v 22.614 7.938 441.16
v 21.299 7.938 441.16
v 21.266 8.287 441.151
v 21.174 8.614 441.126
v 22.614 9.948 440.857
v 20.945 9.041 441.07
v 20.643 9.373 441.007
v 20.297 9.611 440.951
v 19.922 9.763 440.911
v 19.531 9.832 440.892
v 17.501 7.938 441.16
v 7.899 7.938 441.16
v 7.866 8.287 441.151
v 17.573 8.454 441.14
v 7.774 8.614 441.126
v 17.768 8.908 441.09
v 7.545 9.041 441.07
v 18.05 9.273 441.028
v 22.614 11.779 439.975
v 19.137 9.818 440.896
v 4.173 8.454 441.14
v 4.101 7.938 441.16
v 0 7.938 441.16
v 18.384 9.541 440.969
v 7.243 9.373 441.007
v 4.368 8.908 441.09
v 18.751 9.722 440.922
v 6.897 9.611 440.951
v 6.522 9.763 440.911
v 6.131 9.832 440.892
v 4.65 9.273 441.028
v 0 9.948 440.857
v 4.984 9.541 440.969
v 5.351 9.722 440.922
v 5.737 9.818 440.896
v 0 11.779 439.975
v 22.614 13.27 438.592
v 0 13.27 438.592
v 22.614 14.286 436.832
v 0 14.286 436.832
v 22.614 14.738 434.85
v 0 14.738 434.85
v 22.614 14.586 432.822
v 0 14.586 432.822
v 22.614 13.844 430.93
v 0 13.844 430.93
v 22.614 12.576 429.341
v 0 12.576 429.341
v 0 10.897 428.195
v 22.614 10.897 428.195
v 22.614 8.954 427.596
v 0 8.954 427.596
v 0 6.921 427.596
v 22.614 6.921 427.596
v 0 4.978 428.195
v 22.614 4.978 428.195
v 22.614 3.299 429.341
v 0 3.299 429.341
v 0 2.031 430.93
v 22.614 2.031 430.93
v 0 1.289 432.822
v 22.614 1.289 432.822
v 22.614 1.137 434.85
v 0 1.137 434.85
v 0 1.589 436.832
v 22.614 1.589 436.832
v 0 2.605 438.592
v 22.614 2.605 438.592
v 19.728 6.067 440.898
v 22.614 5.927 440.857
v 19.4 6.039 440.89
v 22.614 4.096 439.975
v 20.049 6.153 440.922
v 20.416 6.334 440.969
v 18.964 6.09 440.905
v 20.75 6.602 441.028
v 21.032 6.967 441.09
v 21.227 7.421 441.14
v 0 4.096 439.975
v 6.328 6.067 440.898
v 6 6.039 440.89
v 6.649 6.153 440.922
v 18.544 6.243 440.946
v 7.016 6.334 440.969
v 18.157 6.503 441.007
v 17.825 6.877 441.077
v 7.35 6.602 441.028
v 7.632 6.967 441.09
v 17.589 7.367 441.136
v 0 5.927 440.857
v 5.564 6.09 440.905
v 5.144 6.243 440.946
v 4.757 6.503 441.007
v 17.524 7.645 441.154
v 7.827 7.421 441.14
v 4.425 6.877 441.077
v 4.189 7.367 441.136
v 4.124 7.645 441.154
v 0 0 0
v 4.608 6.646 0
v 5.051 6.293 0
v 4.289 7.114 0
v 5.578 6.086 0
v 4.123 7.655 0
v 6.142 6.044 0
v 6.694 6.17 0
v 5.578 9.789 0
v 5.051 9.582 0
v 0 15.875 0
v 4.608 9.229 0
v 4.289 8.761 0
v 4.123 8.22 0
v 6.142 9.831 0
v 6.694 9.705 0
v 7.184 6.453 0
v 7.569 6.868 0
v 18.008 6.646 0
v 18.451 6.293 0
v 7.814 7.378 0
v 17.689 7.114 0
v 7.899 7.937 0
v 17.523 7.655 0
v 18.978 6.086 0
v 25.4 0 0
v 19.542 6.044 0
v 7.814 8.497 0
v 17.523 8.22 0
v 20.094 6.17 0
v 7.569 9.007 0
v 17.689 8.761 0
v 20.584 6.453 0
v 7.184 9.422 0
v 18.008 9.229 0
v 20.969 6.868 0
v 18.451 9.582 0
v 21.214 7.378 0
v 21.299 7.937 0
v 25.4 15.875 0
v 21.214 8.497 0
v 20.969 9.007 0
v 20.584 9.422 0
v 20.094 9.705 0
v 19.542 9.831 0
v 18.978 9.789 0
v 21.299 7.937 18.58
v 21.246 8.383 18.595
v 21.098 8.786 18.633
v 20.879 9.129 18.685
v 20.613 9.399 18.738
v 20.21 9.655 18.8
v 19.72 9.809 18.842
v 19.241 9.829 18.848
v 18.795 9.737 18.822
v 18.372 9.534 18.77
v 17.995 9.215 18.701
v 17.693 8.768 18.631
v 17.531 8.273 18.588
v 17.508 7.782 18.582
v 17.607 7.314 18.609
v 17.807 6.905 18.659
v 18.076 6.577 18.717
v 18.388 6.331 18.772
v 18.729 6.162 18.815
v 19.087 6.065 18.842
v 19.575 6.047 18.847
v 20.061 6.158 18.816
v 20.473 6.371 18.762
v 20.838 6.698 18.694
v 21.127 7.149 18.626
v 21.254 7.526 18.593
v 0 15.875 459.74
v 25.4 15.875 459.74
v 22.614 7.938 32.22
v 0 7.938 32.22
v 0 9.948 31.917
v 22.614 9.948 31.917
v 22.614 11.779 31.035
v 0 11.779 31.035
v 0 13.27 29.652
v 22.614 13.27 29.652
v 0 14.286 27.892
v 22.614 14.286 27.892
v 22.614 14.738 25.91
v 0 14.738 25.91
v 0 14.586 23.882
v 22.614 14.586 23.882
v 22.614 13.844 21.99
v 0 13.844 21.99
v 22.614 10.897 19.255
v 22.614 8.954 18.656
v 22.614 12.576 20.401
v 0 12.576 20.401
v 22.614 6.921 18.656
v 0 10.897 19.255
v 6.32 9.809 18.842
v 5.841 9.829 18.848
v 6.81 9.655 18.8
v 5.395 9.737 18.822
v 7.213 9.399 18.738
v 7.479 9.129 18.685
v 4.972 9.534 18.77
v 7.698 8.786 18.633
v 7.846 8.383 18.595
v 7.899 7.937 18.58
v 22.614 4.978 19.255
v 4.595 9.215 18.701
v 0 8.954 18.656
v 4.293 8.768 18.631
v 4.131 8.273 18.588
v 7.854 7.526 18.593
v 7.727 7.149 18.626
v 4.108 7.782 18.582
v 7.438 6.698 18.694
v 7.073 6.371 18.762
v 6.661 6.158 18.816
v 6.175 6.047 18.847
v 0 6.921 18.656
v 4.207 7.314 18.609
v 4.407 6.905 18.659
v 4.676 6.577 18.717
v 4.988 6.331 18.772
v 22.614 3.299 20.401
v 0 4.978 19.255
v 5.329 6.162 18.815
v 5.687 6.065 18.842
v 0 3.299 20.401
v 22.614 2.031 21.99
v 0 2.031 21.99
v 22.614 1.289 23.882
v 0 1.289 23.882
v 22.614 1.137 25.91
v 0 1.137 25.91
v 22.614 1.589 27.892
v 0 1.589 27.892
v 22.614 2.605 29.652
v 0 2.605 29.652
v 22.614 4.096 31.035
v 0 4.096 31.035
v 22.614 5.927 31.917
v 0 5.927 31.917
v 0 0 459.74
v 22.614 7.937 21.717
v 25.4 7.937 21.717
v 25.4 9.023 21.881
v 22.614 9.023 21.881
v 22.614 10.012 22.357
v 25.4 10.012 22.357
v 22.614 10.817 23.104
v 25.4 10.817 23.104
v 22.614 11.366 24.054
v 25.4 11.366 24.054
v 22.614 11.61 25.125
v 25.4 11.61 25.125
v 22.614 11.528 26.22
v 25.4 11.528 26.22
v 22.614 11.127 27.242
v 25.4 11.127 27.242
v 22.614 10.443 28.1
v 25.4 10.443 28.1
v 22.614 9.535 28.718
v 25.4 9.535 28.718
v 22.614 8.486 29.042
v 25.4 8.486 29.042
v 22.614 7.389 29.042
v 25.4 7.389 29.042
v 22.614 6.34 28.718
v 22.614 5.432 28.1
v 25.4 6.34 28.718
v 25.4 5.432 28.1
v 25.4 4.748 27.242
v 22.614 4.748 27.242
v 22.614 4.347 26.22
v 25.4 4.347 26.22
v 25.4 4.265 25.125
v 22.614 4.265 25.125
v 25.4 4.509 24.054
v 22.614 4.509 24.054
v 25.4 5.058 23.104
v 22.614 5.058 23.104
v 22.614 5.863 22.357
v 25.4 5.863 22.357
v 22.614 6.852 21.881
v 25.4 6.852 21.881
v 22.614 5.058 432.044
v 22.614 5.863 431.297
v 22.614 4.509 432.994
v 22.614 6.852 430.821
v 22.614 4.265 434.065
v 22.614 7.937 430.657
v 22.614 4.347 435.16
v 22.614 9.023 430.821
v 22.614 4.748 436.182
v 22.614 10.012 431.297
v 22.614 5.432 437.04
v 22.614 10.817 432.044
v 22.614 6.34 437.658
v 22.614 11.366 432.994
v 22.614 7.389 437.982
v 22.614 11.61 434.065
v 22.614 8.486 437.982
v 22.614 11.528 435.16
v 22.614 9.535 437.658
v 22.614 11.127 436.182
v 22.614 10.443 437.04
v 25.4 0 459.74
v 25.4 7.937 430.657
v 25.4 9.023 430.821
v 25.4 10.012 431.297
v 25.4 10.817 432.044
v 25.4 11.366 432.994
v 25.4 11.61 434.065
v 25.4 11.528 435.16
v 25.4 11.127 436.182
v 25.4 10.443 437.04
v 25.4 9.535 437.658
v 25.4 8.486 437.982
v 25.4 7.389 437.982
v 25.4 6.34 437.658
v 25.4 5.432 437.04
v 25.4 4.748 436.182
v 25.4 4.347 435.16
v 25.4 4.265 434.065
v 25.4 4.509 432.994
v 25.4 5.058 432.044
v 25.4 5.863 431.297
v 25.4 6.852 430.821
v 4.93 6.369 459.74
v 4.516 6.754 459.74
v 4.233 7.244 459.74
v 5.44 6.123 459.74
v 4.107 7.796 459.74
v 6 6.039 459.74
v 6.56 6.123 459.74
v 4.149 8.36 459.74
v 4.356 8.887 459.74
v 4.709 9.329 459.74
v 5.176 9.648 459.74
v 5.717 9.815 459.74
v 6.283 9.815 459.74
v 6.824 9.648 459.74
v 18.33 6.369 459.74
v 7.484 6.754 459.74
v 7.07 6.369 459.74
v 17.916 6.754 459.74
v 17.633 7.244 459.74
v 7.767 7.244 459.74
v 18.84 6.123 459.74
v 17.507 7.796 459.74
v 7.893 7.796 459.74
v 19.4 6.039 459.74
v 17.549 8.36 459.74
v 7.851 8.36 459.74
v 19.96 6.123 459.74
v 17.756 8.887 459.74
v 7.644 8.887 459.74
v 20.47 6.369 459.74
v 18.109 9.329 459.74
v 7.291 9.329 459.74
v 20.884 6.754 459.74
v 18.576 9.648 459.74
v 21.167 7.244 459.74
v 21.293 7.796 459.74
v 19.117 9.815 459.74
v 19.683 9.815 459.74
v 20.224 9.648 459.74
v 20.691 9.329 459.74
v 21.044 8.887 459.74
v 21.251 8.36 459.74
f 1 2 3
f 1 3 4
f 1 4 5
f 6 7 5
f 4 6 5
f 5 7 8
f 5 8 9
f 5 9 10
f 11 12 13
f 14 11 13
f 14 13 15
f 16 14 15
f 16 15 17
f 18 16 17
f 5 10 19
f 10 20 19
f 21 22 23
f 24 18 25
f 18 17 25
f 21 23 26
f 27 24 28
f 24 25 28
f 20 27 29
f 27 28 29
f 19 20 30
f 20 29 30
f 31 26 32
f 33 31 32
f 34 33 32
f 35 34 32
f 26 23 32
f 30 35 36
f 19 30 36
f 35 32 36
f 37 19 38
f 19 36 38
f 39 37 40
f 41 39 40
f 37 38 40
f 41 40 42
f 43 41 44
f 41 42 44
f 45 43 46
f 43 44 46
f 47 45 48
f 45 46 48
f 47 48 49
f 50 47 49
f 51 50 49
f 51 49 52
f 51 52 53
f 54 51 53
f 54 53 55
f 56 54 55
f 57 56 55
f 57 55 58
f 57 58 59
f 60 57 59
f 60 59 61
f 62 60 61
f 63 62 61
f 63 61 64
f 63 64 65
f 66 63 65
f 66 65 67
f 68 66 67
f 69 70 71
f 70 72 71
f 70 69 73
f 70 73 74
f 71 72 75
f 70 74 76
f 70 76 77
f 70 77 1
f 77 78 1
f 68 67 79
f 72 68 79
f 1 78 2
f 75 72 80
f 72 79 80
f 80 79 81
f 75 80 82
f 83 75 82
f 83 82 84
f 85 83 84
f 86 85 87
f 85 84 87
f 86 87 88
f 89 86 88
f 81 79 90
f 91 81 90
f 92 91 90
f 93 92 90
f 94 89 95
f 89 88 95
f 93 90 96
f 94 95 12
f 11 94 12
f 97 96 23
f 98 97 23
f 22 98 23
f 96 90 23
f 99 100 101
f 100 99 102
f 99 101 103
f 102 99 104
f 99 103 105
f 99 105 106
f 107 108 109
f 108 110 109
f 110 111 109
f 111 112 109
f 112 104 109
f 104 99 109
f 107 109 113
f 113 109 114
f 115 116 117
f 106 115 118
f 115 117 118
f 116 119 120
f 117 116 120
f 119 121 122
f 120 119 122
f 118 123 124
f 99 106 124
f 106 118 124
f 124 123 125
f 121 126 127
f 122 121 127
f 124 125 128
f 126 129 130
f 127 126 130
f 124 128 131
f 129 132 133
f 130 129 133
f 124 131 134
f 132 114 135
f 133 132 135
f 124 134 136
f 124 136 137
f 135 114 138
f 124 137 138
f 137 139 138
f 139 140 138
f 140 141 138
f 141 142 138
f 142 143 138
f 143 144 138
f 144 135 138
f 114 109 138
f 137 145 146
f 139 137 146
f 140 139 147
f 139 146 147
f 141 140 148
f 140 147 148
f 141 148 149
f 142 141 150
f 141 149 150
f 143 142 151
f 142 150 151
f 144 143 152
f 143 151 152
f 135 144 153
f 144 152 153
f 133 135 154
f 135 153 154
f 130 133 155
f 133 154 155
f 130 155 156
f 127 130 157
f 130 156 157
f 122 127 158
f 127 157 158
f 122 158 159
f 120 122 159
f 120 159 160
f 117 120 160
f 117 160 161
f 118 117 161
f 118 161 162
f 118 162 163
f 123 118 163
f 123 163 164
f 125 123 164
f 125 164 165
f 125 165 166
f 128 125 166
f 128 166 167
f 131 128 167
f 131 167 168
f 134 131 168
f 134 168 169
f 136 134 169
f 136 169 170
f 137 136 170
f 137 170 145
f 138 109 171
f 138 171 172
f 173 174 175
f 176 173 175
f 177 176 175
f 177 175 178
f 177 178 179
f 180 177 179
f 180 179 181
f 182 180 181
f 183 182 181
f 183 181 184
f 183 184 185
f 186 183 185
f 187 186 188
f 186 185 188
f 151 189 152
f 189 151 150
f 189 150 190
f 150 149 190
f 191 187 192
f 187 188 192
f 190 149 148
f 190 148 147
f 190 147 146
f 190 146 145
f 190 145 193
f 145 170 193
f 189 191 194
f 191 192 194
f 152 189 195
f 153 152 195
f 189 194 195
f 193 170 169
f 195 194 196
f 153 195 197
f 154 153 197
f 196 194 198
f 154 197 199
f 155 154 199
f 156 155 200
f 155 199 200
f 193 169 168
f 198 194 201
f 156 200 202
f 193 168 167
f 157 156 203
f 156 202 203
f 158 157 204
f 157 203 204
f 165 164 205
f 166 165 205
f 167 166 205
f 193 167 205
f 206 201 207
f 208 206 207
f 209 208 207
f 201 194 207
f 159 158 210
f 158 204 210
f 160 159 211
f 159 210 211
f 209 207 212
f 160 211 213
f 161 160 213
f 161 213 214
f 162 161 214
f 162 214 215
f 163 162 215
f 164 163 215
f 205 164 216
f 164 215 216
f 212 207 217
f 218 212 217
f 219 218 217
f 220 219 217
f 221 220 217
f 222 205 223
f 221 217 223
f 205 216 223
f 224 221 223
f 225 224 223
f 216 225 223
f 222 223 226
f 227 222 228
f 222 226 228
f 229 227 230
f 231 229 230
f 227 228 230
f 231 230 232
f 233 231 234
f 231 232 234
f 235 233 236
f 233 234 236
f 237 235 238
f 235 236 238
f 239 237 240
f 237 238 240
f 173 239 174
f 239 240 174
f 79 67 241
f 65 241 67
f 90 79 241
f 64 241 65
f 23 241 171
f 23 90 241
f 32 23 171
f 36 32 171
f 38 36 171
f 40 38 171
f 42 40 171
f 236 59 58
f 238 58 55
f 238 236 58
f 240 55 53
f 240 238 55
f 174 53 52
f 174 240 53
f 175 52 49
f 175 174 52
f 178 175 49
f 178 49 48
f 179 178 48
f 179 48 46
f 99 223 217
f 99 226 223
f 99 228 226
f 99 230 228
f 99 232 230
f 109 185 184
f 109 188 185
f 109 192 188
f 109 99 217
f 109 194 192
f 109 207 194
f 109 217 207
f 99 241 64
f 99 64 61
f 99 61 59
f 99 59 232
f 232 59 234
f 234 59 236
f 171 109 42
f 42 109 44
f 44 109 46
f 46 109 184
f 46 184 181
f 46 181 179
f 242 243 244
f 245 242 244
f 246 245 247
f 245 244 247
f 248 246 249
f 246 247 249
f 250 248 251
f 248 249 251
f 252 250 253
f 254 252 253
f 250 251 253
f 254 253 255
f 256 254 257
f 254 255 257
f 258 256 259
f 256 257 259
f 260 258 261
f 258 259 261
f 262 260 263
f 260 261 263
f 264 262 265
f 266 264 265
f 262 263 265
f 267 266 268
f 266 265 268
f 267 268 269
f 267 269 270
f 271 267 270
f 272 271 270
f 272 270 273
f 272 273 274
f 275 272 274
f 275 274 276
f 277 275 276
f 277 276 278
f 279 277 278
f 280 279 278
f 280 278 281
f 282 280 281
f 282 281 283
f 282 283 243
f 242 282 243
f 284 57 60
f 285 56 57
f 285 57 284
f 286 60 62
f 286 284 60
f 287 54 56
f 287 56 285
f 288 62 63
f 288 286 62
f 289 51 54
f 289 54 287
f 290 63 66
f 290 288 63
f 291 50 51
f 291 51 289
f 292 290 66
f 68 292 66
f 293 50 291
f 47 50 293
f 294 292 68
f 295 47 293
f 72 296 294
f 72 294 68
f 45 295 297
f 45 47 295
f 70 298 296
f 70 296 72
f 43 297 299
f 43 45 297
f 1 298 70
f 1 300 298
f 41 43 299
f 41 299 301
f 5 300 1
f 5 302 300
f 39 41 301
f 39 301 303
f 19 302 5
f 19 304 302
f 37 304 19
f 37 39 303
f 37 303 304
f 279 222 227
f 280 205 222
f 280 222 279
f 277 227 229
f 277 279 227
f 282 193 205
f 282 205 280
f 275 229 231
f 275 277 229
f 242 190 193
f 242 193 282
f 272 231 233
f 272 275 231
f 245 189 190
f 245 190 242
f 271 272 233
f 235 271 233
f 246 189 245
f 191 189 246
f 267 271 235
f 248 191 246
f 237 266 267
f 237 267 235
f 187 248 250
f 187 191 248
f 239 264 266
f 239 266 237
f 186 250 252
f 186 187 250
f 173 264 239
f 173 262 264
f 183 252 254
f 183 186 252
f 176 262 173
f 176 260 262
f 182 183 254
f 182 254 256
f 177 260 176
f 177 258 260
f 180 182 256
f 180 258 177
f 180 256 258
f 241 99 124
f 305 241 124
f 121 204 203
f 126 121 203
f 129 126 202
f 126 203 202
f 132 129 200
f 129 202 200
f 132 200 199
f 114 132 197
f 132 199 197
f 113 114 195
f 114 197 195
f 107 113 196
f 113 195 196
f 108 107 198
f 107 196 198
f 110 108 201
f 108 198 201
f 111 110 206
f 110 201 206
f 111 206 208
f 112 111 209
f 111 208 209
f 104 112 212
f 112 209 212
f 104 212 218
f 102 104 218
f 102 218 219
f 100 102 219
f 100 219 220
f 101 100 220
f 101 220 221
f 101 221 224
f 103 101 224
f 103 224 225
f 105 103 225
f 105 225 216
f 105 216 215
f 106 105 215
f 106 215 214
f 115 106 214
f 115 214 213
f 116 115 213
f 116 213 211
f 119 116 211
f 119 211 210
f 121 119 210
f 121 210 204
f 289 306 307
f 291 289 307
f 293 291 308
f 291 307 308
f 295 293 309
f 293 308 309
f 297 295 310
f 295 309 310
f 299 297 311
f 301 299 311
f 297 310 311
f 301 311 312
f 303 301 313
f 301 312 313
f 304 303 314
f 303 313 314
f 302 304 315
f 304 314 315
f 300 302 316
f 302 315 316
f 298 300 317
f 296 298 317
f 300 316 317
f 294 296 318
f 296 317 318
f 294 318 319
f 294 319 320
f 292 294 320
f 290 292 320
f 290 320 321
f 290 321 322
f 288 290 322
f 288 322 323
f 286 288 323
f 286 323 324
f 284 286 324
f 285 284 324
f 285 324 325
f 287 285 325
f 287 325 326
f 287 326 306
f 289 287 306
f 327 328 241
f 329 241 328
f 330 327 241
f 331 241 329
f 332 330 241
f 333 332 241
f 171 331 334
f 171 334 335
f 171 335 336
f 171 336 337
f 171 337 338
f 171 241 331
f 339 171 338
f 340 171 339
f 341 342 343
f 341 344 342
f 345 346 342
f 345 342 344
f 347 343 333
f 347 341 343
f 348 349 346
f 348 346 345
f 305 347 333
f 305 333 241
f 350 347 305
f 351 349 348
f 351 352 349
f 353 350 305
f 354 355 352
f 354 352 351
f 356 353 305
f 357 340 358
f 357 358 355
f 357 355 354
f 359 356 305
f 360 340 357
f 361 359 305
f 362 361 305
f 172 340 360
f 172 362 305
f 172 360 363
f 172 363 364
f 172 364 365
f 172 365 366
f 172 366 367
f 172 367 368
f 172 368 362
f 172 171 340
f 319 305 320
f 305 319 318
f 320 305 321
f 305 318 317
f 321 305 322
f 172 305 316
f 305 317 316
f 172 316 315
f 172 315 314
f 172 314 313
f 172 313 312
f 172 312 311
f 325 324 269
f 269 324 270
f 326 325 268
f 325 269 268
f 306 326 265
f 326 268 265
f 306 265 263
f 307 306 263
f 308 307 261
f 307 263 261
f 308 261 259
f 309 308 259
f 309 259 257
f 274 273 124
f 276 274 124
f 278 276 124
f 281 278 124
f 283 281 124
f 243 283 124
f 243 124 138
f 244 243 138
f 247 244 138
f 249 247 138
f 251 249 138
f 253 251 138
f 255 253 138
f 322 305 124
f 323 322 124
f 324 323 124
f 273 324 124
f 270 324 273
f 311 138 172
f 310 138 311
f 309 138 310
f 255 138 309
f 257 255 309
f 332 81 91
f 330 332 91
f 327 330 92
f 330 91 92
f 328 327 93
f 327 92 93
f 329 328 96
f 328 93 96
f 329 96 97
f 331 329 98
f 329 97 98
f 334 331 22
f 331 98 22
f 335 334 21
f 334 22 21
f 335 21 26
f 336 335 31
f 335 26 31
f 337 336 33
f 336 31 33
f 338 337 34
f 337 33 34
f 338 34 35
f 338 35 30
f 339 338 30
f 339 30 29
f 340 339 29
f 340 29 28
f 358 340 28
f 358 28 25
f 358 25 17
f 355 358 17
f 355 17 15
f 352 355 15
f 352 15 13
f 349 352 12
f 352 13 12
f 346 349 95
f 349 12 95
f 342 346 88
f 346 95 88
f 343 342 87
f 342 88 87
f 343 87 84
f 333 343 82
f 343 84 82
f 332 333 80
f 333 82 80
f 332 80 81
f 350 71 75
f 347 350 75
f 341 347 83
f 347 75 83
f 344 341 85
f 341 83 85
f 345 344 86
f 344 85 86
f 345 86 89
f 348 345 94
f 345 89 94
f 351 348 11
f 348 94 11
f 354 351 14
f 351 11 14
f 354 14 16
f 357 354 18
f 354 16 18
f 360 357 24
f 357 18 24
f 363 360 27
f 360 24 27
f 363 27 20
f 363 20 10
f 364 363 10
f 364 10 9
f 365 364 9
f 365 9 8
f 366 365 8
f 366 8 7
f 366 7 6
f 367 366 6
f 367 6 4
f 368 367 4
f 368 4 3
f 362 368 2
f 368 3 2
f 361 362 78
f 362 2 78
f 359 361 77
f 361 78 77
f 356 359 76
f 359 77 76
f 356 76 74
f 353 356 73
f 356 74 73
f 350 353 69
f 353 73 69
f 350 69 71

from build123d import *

# Parameters (mm, degrees)
SKETCH1_W                      = 25.4
SKETCH1_H                      = 15.875
BOSS_EXTRUDE1_DEPTH            = 459.74
SKETCH8_R                      = 6.8199
CUT_EXTRUDE1_DEPTH             = 22.61362
L_0_29_DIAMETER_HOLE1_D        = 7.366
L_0_29_DIAMETER_HOLE1_DEPTH    = 50.8
L_0_29_DIAMETER_HOLE1_TIP      = 2.21296966
TAP_DRILL_FOR_10_24_TAP2_D     = 3.7973
TAP_DRILL_FOR_10_24_TAP2_DEPTH = 20.701
TAP_DRILL_FOR_10_24_TAP2_TIP   = 1.140824014
TAP_DRILL_FOR_10_24_TAP1_D     = 3.7973
TAP_DRILL_FOR_10_24_TAP1_DEPTH = 20.701
TAP_DRILL_FOR_10_24_TAP1_TIP   = 1.140824014


with BuildPart() as part:
    # Sketch1 → Boss-Extrude1 (new body)
    with BuildSketch(Plane.XY):
        with Locations((12.7, 7.9375)):
            Rectangle(SKETCH1_W, SKETCH1_H)
    extrude(amount=BOSS_EXTRUDE1_DEPTH)

    # Sketch8 → Cut-Extrude1 (cut)
    with BuildSketch(Plane.ZY):
        with Locations((434.34, 7.9375)):
            Circle(SKETCH8_R)
        with Locations((25.4, 7.9375)):
            Circle(SKETCH8_R)
    extrude(amount=-CUT_EXTRUDE1_DEPTH, mode=Mode.SUBTRACT)

    # L (0.29) Diameter Hole1
    with Locations(Plane.ZY.offset(-22.61362)):
        with Locations((25.4, 7.9375), (434.34, 7.9375)):
            Hole(L_0_29_DIAMETER_HOLE1_D / 2, depth=L_0_29_DIAMETER_HOLE1_DEPTH)
            with Locations((0, 0, -(L_0_29_DIAMETER_HOLE1_DEPTH + L_0_29_DIAMETER_HOLE1_TIP / 2))):  # 118° drill point
                Cone(0, L_0_29_DIAMETER_HOLE1_D / 2, L_0_29_DIAMETER_HOLE1_TIP, mode=Mode.SUBTRACT)

    # Tap Drill for #10-24 Tap2
    with Locations(Plane(origin=(-2202.638131805, 879.599136144, 459.74), x_dir=(0, 1, 0), z_dir=(0, 0, 1))):
        with Locations((-871.661636144, -2222.038131805), (-871.661636144, -2208.638131805)):
            Hole(TAP_DRILL_FOR_10_24_TAP2_D / 2, depth=TAP_DRILL_FOR_10_24_TAP2_DEPTH)
            with Locations((0, 0, -(TAP_DRILL_FOR_10_24_TAP2_DEPTH + TAP_DRILL_FOR_10_24_TAP2_TIP / 2))):  # 118° drill point
                Cone(0, TAP_DRILL_FOR_10_24_TAP2_D / 2, TAP_DRILL_FOR_10_24_TAP2_TIP, mode=Mode.SUBTRACT)

    # Tap Drill for #10-24 Tap1
    with Locations(Plane(origin=(0, 0, 0), x_dir=(-1, 0, 0), z_dir=(0, 0, -1))):
        with Locations((-19.4, 7.9375), (-6, 7.9375)):
            Hole(TAP_DRILL_FOR_10_24_TAP1_D / 2, depth=TAP_DRILL_FOR_10_24_TAP1_DEPTH)
            with Locations((0, 0, -(TAP_DRILL_FOR_10_24_TAP1_DEPTH + TAP_DRILL_FOR_10_24_TAP1_TIP / 2))):  # 118° drill point
                Cone(0, TAP_DRILL_FOR_10_24_TAP1_D / 2, TAP_DRILL_FOR_10_24_TAP1_TIP, mode=Mode.SUBTRACT)


solid = part.part
